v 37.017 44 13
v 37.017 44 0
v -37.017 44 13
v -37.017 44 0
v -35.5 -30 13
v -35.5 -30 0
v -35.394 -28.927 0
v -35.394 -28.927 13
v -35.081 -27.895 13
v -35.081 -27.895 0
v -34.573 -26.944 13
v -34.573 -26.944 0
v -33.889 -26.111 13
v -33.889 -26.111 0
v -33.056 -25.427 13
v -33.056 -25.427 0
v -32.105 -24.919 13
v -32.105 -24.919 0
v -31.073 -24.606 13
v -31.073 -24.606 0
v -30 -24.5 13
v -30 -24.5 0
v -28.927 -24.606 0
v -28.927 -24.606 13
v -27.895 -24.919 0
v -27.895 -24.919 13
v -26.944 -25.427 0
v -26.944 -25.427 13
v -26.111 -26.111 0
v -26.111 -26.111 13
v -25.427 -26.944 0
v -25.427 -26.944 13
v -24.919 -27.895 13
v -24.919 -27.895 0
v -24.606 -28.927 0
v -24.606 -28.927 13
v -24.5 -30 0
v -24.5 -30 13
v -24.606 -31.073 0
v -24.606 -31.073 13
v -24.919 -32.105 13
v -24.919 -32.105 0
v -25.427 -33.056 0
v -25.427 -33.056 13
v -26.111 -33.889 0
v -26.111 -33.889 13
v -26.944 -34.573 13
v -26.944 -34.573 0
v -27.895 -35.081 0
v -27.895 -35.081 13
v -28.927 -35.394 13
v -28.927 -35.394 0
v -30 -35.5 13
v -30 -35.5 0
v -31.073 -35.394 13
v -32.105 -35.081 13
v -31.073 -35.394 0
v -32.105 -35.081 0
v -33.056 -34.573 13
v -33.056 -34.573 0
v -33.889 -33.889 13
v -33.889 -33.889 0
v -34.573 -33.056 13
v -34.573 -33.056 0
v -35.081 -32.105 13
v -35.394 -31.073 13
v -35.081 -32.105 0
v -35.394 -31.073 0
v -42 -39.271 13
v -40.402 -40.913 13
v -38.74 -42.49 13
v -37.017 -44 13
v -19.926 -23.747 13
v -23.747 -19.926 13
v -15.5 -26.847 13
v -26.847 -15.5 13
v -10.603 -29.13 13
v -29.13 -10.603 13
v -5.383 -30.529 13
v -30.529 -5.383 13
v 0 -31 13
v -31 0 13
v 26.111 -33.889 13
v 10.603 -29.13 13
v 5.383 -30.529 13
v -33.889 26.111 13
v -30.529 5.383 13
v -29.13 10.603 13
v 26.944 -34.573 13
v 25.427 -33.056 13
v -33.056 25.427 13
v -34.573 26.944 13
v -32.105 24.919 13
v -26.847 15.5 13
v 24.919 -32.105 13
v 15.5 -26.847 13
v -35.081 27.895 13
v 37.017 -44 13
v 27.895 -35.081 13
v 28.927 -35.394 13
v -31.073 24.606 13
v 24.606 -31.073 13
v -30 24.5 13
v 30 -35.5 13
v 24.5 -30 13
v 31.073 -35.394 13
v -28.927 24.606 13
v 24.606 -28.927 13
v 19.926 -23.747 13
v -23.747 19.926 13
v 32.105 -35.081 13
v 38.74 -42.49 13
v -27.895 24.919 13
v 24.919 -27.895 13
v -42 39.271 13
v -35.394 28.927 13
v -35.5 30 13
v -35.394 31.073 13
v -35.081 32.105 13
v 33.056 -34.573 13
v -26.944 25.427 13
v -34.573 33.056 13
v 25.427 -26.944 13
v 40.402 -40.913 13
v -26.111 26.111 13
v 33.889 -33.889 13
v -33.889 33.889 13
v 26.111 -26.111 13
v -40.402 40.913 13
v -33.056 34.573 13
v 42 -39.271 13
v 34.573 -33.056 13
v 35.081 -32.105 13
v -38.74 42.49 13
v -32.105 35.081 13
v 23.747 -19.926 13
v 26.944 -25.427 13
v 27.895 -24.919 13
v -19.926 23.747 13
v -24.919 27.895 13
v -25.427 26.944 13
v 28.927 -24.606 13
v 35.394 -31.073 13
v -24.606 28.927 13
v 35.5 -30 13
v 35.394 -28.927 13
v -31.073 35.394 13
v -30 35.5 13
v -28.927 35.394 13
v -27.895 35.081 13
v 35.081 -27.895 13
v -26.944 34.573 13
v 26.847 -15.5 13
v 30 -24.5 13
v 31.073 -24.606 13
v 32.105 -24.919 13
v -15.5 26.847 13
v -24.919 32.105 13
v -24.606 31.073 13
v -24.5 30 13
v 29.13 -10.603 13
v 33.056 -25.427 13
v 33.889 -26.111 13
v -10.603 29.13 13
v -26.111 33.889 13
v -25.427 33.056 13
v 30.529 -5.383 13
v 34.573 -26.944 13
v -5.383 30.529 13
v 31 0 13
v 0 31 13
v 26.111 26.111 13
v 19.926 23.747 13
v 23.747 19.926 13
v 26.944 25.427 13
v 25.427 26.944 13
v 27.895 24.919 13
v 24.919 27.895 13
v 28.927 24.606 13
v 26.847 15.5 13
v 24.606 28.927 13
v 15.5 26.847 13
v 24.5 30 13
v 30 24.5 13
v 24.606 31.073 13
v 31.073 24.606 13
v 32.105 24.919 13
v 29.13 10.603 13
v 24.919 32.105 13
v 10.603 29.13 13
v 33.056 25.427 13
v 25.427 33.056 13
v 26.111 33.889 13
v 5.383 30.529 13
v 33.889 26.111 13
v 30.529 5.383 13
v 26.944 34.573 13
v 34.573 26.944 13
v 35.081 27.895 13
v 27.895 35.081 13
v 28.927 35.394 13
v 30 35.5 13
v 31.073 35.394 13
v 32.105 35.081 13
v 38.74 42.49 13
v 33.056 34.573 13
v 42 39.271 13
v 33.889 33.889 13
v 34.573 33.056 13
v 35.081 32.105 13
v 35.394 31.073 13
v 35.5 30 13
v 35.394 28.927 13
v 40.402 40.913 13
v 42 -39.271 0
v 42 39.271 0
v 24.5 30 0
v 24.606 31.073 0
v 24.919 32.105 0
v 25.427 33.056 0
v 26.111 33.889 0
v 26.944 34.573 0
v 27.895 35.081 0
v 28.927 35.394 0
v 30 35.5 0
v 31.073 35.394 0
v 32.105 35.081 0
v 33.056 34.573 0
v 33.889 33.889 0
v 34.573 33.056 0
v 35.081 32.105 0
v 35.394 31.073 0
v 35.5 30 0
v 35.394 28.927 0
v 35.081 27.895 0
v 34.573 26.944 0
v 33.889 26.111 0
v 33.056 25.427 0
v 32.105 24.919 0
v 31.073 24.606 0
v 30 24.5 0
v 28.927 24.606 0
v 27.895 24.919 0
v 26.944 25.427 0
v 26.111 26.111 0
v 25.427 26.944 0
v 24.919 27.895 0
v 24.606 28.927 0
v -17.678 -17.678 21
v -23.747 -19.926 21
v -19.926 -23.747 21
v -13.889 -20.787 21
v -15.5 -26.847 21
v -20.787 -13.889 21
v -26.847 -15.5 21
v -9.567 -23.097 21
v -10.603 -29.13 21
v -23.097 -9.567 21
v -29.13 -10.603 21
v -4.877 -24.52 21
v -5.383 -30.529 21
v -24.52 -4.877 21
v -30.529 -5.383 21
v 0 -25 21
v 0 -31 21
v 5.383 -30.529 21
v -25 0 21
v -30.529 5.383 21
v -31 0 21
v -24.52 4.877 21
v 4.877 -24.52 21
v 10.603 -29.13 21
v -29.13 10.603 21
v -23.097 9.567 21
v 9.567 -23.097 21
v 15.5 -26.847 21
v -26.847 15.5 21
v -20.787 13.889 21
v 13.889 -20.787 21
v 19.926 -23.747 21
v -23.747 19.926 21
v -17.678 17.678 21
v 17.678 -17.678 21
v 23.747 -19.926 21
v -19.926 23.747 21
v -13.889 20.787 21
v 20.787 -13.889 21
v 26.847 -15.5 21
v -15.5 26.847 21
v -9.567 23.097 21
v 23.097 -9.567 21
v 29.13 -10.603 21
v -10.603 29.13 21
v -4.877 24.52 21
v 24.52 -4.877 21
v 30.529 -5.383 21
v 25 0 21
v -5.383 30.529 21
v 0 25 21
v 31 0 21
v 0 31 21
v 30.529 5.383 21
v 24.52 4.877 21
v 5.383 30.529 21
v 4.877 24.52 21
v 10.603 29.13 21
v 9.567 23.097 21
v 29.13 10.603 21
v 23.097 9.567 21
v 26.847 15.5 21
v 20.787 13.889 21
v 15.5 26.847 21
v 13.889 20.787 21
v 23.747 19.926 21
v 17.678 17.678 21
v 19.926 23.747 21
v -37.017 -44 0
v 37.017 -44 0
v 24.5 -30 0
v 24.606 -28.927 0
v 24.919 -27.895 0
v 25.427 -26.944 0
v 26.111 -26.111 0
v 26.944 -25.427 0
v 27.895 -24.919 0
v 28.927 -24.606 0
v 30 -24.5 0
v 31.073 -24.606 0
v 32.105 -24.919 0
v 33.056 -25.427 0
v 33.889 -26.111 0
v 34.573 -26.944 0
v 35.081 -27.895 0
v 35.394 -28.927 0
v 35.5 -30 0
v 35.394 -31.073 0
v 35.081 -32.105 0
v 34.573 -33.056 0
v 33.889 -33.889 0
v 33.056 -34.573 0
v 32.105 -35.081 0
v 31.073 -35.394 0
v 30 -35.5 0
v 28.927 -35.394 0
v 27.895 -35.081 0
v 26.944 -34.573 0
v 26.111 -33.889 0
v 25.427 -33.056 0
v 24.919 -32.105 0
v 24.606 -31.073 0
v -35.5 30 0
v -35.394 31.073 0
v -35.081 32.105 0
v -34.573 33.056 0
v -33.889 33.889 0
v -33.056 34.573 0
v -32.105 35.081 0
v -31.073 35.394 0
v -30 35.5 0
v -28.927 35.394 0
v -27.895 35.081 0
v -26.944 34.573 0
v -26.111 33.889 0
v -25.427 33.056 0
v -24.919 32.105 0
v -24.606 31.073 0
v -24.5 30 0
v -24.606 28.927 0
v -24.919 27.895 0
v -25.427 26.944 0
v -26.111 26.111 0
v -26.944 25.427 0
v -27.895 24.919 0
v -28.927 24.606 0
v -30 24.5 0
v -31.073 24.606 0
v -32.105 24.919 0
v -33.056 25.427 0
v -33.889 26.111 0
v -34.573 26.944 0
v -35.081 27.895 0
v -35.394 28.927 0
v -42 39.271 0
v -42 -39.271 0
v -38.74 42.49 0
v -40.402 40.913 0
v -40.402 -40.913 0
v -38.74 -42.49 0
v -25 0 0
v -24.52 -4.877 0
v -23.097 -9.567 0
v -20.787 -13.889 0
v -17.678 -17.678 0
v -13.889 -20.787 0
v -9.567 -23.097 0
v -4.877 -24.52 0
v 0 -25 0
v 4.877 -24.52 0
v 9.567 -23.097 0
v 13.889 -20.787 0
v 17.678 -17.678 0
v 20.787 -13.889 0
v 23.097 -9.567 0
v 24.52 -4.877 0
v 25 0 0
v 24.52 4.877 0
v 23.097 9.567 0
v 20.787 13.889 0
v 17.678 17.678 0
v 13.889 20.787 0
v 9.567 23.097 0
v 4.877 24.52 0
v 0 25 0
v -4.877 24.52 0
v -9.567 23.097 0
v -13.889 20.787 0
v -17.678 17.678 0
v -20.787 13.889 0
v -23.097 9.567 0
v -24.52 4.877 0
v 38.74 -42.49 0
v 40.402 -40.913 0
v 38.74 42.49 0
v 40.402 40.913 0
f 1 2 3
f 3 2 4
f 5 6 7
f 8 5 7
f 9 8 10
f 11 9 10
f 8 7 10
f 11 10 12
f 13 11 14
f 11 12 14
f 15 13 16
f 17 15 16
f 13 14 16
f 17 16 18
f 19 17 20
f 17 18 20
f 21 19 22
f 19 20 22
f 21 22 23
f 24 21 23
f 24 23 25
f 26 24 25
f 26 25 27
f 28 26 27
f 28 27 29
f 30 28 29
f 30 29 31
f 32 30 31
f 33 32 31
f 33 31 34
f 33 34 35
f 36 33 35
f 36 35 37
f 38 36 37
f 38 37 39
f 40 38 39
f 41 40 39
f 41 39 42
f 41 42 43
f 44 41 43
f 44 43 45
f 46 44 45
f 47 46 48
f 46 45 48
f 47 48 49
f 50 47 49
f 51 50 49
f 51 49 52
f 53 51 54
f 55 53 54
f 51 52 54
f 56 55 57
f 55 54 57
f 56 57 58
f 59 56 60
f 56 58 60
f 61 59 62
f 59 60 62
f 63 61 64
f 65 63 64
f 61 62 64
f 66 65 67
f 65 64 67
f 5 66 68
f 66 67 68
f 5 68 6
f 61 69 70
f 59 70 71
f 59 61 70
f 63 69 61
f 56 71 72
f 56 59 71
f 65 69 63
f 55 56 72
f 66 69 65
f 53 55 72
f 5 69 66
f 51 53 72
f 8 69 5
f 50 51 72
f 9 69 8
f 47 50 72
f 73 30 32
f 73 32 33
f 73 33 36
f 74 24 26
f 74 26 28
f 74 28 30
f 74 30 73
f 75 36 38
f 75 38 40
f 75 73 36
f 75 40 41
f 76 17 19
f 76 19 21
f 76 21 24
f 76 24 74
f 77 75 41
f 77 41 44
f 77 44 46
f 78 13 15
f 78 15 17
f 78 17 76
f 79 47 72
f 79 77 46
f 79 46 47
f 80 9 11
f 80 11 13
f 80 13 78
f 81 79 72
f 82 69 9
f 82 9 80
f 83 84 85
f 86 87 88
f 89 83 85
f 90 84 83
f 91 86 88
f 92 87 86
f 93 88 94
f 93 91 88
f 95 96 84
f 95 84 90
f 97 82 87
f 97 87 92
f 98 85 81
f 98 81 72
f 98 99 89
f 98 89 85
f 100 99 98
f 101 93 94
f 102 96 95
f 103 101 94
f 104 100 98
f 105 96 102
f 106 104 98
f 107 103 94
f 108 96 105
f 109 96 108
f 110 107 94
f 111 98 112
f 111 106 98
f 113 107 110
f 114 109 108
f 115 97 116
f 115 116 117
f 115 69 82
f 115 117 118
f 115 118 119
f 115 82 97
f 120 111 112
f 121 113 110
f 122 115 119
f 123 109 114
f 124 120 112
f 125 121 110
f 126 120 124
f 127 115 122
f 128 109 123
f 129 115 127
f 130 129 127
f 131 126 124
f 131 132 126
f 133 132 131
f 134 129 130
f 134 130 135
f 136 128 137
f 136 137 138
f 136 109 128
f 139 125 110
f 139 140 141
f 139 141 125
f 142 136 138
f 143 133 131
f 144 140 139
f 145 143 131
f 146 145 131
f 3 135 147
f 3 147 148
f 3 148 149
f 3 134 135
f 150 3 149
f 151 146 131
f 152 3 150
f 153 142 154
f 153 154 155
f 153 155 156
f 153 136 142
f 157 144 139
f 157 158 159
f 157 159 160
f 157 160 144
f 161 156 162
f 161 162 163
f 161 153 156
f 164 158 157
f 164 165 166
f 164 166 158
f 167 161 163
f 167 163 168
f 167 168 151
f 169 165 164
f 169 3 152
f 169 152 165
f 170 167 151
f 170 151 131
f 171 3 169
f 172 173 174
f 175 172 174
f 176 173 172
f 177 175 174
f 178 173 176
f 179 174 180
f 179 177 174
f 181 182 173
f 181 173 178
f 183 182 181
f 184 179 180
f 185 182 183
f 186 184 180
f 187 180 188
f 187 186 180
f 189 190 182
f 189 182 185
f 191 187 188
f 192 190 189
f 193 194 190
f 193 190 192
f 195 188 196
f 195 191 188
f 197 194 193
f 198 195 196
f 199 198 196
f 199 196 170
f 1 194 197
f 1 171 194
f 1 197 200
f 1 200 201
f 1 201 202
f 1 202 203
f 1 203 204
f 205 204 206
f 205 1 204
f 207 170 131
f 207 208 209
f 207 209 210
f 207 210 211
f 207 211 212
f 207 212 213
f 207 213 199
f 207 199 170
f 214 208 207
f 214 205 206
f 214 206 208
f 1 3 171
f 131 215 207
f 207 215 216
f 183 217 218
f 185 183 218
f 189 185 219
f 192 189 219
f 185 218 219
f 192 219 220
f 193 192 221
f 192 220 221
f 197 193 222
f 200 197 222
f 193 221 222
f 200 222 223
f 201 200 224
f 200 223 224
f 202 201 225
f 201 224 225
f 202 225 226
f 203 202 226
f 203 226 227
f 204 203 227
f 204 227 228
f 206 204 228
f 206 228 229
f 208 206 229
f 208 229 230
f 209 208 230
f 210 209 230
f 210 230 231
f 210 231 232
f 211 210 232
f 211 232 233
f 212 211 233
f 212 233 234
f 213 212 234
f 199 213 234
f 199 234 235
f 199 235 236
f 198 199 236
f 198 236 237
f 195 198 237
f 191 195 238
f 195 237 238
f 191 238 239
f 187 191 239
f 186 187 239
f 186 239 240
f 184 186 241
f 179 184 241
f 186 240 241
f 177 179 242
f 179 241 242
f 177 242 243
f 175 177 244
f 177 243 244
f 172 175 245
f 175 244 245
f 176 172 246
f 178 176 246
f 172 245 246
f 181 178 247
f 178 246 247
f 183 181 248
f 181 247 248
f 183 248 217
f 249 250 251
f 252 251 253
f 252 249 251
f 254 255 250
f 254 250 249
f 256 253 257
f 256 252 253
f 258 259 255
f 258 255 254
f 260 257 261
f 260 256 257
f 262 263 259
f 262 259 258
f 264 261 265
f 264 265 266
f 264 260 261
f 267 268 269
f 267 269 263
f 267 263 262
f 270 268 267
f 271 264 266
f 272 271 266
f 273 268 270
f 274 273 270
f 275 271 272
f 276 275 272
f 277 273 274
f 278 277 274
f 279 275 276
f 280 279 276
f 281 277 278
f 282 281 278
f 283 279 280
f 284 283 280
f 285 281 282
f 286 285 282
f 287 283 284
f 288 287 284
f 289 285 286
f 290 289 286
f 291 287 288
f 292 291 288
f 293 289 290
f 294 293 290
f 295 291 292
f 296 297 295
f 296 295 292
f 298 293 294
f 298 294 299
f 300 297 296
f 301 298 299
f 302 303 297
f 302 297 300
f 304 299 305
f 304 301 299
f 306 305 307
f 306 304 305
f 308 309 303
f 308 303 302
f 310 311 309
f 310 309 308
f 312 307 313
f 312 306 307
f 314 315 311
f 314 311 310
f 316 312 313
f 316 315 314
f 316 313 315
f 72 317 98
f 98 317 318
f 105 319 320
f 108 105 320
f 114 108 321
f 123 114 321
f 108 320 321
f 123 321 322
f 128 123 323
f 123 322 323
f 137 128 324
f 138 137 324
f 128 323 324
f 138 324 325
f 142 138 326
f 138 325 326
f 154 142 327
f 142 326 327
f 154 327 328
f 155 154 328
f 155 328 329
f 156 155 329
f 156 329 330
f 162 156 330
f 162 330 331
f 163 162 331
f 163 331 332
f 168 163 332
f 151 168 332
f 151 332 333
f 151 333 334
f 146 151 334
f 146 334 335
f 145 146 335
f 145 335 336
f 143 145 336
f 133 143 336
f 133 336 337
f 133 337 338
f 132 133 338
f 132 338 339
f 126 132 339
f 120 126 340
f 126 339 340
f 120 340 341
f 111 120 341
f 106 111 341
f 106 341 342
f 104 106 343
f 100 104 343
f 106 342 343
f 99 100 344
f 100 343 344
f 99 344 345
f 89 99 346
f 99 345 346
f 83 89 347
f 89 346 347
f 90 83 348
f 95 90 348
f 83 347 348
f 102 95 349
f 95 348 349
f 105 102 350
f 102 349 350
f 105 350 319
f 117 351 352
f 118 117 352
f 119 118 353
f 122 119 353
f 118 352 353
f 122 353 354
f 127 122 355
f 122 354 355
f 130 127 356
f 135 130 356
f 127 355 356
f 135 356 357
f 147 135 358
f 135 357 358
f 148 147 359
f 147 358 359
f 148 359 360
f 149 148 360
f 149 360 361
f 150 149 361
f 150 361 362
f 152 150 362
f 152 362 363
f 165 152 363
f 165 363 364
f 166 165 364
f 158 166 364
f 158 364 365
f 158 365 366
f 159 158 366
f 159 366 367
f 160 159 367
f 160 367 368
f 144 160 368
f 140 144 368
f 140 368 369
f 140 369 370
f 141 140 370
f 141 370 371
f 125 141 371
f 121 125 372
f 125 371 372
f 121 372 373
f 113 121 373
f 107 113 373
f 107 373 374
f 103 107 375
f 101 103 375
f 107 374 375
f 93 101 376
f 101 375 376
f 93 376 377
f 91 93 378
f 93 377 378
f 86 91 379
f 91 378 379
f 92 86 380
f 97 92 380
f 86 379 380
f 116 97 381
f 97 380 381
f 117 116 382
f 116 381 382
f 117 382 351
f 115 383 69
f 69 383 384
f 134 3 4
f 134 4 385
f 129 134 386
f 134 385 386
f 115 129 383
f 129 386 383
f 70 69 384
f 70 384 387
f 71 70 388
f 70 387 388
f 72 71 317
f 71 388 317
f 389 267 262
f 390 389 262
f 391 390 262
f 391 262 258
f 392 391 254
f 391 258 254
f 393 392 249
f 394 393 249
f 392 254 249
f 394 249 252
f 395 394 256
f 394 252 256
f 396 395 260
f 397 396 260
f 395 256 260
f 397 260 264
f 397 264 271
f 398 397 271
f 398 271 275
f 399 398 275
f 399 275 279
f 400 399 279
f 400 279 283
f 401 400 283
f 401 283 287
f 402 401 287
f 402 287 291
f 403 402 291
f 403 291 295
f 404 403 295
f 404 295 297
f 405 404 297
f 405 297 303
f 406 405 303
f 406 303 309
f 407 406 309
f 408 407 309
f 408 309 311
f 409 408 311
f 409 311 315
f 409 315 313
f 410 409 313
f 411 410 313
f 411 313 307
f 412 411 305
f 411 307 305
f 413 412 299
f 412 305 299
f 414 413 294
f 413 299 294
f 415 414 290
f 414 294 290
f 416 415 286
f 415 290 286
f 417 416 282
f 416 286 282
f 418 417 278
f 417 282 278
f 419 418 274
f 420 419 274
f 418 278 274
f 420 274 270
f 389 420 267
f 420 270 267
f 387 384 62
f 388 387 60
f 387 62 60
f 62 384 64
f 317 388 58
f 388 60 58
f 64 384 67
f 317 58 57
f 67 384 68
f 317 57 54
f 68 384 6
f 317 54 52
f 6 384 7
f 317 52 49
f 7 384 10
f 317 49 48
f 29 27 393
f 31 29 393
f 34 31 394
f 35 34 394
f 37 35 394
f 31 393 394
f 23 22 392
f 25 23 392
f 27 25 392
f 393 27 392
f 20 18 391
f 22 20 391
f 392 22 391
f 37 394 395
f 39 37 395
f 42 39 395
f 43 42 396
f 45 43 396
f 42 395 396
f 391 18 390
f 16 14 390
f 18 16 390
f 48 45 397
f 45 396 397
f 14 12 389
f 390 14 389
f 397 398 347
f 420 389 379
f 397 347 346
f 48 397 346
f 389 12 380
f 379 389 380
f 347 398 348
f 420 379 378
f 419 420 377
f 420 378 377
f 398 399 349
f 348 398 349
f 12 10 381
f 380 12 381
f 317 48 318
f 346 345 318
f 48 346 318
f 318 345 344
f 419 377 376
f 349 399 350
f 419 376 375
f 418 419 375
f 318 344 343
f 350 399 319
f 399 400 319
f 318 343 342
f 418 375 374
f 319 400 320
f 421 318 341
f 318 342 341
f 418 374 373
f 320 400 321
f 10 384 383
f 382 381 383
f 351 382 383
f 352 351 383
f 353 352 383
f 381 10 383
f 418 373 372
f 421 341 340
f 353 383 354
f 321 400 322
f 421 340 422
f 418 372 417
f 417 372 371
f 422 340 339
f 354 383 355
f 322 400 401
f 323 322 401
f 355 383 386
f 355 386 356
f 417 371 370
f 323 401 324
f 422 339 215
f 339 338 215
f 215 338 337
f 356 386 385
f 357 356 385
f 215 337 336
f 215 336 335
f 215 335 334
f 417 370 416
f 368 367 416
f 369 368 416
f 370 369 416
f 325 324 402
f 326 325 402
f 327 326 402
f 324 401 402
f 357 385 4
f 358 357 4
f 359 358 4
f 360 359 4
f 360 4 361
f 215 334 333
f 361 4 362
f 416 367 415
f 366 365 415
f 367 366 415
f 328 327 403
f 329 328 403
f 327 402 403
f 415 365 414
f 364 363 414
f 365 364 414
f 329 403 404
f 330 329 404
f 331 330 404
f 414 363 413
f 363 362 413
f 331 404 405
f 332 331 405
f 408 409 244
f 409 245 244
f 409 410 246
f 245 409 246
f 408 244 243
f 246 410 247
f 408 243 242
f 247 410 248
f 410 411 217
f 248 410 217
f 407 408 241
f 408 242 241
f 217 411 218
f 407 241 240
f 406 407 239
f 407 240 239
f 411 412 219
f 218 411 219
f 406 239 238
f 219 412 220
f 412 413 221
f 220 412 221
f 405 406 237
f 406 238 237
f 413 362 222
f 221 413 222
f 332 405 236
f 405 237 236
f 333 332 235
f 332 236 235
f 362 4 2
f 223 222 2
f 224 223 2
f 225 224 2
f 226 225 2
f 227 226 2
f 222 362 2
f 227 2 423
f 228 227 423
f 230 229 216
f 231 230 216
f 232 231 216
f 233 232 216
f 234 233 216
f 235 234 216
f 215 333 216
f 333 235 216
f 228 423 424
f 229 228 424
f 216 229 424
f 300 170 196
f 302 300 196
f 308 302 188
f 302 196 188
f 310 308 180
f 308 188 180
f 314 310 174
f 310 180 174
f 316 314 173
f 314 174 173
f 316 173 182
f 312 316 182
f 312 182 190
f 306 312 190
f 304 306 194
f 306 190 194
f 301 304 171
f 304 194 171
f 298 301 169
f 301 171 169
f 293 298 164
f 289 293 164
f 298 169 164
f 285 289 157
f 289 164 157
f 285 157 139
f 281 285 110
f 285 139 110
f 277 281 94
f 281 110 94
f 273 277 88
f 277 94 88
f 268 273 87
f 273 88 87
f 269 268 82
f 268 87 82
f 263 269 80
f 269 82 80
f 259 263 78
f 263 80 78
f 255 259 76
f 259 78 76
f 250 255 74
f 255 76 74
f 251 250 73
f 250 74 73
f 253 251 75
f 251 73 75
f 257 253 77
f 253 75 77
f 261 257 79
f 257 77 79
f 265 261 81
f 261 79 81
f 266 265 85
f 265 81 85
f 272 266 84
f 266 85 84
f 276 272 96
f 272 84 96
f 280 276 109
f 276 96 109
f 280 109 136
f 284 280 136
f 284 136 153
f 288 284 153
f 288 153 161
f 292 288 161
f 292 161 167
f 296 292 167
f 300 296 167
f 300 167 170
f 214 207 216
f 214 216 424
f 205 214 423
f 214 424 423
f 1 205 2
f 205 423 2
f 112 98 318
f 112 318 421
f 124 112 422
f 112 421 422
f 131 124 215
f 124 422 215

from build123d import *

# Parameters (mm, degrees)
F1_DEPTH = 13
F2_R     = 31
F3_DEPTH = 8
F4_D     = 50
F6_D     = 11


with BuildPart() as f1:
    # F0 (on Top) → F1 (new body)
    with BuildSketch(Plane.XY):
        with BuildLine():
            Line((37.016888, 44), (-37.016888, 44))
            ThreePointArc((-37.016888, 44), (-39.579121, 41.710228), (-42, 39.271491))
            Line((-42, 39.271491), (-42, -39.271491))
            ThreePointArc((-42, -39.271491), (-39.579121, -41.710228), (-37.016888, -44))
            Line((-37.016888, -44), (37.016888, -44))
            ThreePointArc((37.016888, -44), (39.579121, -41.710228), (42, -39.271491))
            Line((42, -39.271491), (42, 39.271491))
            ThreePointArc((42, 39.271491), (39.579121, 41.710228), (37.016888, 44))
        make_face()
    extrude(amount=F1_DEPTH)

    # F2 (on face) → F3 (join)
    with BuildSketch(Plane.XY.offset(13)):
        Circle(F2_R)
    extrude(amount=F3_DEPTH)

    # F4 (through all)
    with Locations(Plane(origin=(0, 0, 0), x_dir=(1, 0, 0), z_dir=(0, 0, -1))):
        with Locations((0, 0)):
            Hole(F4_D / 2)

    # F6 (through all)
    with Locations(Plane.XY.offset(13)):
        with Locations((-30, 30), (30, 30), (-30, -30), (30, -30)):
            Hole(F6_D / 2)


solid = f1.part
